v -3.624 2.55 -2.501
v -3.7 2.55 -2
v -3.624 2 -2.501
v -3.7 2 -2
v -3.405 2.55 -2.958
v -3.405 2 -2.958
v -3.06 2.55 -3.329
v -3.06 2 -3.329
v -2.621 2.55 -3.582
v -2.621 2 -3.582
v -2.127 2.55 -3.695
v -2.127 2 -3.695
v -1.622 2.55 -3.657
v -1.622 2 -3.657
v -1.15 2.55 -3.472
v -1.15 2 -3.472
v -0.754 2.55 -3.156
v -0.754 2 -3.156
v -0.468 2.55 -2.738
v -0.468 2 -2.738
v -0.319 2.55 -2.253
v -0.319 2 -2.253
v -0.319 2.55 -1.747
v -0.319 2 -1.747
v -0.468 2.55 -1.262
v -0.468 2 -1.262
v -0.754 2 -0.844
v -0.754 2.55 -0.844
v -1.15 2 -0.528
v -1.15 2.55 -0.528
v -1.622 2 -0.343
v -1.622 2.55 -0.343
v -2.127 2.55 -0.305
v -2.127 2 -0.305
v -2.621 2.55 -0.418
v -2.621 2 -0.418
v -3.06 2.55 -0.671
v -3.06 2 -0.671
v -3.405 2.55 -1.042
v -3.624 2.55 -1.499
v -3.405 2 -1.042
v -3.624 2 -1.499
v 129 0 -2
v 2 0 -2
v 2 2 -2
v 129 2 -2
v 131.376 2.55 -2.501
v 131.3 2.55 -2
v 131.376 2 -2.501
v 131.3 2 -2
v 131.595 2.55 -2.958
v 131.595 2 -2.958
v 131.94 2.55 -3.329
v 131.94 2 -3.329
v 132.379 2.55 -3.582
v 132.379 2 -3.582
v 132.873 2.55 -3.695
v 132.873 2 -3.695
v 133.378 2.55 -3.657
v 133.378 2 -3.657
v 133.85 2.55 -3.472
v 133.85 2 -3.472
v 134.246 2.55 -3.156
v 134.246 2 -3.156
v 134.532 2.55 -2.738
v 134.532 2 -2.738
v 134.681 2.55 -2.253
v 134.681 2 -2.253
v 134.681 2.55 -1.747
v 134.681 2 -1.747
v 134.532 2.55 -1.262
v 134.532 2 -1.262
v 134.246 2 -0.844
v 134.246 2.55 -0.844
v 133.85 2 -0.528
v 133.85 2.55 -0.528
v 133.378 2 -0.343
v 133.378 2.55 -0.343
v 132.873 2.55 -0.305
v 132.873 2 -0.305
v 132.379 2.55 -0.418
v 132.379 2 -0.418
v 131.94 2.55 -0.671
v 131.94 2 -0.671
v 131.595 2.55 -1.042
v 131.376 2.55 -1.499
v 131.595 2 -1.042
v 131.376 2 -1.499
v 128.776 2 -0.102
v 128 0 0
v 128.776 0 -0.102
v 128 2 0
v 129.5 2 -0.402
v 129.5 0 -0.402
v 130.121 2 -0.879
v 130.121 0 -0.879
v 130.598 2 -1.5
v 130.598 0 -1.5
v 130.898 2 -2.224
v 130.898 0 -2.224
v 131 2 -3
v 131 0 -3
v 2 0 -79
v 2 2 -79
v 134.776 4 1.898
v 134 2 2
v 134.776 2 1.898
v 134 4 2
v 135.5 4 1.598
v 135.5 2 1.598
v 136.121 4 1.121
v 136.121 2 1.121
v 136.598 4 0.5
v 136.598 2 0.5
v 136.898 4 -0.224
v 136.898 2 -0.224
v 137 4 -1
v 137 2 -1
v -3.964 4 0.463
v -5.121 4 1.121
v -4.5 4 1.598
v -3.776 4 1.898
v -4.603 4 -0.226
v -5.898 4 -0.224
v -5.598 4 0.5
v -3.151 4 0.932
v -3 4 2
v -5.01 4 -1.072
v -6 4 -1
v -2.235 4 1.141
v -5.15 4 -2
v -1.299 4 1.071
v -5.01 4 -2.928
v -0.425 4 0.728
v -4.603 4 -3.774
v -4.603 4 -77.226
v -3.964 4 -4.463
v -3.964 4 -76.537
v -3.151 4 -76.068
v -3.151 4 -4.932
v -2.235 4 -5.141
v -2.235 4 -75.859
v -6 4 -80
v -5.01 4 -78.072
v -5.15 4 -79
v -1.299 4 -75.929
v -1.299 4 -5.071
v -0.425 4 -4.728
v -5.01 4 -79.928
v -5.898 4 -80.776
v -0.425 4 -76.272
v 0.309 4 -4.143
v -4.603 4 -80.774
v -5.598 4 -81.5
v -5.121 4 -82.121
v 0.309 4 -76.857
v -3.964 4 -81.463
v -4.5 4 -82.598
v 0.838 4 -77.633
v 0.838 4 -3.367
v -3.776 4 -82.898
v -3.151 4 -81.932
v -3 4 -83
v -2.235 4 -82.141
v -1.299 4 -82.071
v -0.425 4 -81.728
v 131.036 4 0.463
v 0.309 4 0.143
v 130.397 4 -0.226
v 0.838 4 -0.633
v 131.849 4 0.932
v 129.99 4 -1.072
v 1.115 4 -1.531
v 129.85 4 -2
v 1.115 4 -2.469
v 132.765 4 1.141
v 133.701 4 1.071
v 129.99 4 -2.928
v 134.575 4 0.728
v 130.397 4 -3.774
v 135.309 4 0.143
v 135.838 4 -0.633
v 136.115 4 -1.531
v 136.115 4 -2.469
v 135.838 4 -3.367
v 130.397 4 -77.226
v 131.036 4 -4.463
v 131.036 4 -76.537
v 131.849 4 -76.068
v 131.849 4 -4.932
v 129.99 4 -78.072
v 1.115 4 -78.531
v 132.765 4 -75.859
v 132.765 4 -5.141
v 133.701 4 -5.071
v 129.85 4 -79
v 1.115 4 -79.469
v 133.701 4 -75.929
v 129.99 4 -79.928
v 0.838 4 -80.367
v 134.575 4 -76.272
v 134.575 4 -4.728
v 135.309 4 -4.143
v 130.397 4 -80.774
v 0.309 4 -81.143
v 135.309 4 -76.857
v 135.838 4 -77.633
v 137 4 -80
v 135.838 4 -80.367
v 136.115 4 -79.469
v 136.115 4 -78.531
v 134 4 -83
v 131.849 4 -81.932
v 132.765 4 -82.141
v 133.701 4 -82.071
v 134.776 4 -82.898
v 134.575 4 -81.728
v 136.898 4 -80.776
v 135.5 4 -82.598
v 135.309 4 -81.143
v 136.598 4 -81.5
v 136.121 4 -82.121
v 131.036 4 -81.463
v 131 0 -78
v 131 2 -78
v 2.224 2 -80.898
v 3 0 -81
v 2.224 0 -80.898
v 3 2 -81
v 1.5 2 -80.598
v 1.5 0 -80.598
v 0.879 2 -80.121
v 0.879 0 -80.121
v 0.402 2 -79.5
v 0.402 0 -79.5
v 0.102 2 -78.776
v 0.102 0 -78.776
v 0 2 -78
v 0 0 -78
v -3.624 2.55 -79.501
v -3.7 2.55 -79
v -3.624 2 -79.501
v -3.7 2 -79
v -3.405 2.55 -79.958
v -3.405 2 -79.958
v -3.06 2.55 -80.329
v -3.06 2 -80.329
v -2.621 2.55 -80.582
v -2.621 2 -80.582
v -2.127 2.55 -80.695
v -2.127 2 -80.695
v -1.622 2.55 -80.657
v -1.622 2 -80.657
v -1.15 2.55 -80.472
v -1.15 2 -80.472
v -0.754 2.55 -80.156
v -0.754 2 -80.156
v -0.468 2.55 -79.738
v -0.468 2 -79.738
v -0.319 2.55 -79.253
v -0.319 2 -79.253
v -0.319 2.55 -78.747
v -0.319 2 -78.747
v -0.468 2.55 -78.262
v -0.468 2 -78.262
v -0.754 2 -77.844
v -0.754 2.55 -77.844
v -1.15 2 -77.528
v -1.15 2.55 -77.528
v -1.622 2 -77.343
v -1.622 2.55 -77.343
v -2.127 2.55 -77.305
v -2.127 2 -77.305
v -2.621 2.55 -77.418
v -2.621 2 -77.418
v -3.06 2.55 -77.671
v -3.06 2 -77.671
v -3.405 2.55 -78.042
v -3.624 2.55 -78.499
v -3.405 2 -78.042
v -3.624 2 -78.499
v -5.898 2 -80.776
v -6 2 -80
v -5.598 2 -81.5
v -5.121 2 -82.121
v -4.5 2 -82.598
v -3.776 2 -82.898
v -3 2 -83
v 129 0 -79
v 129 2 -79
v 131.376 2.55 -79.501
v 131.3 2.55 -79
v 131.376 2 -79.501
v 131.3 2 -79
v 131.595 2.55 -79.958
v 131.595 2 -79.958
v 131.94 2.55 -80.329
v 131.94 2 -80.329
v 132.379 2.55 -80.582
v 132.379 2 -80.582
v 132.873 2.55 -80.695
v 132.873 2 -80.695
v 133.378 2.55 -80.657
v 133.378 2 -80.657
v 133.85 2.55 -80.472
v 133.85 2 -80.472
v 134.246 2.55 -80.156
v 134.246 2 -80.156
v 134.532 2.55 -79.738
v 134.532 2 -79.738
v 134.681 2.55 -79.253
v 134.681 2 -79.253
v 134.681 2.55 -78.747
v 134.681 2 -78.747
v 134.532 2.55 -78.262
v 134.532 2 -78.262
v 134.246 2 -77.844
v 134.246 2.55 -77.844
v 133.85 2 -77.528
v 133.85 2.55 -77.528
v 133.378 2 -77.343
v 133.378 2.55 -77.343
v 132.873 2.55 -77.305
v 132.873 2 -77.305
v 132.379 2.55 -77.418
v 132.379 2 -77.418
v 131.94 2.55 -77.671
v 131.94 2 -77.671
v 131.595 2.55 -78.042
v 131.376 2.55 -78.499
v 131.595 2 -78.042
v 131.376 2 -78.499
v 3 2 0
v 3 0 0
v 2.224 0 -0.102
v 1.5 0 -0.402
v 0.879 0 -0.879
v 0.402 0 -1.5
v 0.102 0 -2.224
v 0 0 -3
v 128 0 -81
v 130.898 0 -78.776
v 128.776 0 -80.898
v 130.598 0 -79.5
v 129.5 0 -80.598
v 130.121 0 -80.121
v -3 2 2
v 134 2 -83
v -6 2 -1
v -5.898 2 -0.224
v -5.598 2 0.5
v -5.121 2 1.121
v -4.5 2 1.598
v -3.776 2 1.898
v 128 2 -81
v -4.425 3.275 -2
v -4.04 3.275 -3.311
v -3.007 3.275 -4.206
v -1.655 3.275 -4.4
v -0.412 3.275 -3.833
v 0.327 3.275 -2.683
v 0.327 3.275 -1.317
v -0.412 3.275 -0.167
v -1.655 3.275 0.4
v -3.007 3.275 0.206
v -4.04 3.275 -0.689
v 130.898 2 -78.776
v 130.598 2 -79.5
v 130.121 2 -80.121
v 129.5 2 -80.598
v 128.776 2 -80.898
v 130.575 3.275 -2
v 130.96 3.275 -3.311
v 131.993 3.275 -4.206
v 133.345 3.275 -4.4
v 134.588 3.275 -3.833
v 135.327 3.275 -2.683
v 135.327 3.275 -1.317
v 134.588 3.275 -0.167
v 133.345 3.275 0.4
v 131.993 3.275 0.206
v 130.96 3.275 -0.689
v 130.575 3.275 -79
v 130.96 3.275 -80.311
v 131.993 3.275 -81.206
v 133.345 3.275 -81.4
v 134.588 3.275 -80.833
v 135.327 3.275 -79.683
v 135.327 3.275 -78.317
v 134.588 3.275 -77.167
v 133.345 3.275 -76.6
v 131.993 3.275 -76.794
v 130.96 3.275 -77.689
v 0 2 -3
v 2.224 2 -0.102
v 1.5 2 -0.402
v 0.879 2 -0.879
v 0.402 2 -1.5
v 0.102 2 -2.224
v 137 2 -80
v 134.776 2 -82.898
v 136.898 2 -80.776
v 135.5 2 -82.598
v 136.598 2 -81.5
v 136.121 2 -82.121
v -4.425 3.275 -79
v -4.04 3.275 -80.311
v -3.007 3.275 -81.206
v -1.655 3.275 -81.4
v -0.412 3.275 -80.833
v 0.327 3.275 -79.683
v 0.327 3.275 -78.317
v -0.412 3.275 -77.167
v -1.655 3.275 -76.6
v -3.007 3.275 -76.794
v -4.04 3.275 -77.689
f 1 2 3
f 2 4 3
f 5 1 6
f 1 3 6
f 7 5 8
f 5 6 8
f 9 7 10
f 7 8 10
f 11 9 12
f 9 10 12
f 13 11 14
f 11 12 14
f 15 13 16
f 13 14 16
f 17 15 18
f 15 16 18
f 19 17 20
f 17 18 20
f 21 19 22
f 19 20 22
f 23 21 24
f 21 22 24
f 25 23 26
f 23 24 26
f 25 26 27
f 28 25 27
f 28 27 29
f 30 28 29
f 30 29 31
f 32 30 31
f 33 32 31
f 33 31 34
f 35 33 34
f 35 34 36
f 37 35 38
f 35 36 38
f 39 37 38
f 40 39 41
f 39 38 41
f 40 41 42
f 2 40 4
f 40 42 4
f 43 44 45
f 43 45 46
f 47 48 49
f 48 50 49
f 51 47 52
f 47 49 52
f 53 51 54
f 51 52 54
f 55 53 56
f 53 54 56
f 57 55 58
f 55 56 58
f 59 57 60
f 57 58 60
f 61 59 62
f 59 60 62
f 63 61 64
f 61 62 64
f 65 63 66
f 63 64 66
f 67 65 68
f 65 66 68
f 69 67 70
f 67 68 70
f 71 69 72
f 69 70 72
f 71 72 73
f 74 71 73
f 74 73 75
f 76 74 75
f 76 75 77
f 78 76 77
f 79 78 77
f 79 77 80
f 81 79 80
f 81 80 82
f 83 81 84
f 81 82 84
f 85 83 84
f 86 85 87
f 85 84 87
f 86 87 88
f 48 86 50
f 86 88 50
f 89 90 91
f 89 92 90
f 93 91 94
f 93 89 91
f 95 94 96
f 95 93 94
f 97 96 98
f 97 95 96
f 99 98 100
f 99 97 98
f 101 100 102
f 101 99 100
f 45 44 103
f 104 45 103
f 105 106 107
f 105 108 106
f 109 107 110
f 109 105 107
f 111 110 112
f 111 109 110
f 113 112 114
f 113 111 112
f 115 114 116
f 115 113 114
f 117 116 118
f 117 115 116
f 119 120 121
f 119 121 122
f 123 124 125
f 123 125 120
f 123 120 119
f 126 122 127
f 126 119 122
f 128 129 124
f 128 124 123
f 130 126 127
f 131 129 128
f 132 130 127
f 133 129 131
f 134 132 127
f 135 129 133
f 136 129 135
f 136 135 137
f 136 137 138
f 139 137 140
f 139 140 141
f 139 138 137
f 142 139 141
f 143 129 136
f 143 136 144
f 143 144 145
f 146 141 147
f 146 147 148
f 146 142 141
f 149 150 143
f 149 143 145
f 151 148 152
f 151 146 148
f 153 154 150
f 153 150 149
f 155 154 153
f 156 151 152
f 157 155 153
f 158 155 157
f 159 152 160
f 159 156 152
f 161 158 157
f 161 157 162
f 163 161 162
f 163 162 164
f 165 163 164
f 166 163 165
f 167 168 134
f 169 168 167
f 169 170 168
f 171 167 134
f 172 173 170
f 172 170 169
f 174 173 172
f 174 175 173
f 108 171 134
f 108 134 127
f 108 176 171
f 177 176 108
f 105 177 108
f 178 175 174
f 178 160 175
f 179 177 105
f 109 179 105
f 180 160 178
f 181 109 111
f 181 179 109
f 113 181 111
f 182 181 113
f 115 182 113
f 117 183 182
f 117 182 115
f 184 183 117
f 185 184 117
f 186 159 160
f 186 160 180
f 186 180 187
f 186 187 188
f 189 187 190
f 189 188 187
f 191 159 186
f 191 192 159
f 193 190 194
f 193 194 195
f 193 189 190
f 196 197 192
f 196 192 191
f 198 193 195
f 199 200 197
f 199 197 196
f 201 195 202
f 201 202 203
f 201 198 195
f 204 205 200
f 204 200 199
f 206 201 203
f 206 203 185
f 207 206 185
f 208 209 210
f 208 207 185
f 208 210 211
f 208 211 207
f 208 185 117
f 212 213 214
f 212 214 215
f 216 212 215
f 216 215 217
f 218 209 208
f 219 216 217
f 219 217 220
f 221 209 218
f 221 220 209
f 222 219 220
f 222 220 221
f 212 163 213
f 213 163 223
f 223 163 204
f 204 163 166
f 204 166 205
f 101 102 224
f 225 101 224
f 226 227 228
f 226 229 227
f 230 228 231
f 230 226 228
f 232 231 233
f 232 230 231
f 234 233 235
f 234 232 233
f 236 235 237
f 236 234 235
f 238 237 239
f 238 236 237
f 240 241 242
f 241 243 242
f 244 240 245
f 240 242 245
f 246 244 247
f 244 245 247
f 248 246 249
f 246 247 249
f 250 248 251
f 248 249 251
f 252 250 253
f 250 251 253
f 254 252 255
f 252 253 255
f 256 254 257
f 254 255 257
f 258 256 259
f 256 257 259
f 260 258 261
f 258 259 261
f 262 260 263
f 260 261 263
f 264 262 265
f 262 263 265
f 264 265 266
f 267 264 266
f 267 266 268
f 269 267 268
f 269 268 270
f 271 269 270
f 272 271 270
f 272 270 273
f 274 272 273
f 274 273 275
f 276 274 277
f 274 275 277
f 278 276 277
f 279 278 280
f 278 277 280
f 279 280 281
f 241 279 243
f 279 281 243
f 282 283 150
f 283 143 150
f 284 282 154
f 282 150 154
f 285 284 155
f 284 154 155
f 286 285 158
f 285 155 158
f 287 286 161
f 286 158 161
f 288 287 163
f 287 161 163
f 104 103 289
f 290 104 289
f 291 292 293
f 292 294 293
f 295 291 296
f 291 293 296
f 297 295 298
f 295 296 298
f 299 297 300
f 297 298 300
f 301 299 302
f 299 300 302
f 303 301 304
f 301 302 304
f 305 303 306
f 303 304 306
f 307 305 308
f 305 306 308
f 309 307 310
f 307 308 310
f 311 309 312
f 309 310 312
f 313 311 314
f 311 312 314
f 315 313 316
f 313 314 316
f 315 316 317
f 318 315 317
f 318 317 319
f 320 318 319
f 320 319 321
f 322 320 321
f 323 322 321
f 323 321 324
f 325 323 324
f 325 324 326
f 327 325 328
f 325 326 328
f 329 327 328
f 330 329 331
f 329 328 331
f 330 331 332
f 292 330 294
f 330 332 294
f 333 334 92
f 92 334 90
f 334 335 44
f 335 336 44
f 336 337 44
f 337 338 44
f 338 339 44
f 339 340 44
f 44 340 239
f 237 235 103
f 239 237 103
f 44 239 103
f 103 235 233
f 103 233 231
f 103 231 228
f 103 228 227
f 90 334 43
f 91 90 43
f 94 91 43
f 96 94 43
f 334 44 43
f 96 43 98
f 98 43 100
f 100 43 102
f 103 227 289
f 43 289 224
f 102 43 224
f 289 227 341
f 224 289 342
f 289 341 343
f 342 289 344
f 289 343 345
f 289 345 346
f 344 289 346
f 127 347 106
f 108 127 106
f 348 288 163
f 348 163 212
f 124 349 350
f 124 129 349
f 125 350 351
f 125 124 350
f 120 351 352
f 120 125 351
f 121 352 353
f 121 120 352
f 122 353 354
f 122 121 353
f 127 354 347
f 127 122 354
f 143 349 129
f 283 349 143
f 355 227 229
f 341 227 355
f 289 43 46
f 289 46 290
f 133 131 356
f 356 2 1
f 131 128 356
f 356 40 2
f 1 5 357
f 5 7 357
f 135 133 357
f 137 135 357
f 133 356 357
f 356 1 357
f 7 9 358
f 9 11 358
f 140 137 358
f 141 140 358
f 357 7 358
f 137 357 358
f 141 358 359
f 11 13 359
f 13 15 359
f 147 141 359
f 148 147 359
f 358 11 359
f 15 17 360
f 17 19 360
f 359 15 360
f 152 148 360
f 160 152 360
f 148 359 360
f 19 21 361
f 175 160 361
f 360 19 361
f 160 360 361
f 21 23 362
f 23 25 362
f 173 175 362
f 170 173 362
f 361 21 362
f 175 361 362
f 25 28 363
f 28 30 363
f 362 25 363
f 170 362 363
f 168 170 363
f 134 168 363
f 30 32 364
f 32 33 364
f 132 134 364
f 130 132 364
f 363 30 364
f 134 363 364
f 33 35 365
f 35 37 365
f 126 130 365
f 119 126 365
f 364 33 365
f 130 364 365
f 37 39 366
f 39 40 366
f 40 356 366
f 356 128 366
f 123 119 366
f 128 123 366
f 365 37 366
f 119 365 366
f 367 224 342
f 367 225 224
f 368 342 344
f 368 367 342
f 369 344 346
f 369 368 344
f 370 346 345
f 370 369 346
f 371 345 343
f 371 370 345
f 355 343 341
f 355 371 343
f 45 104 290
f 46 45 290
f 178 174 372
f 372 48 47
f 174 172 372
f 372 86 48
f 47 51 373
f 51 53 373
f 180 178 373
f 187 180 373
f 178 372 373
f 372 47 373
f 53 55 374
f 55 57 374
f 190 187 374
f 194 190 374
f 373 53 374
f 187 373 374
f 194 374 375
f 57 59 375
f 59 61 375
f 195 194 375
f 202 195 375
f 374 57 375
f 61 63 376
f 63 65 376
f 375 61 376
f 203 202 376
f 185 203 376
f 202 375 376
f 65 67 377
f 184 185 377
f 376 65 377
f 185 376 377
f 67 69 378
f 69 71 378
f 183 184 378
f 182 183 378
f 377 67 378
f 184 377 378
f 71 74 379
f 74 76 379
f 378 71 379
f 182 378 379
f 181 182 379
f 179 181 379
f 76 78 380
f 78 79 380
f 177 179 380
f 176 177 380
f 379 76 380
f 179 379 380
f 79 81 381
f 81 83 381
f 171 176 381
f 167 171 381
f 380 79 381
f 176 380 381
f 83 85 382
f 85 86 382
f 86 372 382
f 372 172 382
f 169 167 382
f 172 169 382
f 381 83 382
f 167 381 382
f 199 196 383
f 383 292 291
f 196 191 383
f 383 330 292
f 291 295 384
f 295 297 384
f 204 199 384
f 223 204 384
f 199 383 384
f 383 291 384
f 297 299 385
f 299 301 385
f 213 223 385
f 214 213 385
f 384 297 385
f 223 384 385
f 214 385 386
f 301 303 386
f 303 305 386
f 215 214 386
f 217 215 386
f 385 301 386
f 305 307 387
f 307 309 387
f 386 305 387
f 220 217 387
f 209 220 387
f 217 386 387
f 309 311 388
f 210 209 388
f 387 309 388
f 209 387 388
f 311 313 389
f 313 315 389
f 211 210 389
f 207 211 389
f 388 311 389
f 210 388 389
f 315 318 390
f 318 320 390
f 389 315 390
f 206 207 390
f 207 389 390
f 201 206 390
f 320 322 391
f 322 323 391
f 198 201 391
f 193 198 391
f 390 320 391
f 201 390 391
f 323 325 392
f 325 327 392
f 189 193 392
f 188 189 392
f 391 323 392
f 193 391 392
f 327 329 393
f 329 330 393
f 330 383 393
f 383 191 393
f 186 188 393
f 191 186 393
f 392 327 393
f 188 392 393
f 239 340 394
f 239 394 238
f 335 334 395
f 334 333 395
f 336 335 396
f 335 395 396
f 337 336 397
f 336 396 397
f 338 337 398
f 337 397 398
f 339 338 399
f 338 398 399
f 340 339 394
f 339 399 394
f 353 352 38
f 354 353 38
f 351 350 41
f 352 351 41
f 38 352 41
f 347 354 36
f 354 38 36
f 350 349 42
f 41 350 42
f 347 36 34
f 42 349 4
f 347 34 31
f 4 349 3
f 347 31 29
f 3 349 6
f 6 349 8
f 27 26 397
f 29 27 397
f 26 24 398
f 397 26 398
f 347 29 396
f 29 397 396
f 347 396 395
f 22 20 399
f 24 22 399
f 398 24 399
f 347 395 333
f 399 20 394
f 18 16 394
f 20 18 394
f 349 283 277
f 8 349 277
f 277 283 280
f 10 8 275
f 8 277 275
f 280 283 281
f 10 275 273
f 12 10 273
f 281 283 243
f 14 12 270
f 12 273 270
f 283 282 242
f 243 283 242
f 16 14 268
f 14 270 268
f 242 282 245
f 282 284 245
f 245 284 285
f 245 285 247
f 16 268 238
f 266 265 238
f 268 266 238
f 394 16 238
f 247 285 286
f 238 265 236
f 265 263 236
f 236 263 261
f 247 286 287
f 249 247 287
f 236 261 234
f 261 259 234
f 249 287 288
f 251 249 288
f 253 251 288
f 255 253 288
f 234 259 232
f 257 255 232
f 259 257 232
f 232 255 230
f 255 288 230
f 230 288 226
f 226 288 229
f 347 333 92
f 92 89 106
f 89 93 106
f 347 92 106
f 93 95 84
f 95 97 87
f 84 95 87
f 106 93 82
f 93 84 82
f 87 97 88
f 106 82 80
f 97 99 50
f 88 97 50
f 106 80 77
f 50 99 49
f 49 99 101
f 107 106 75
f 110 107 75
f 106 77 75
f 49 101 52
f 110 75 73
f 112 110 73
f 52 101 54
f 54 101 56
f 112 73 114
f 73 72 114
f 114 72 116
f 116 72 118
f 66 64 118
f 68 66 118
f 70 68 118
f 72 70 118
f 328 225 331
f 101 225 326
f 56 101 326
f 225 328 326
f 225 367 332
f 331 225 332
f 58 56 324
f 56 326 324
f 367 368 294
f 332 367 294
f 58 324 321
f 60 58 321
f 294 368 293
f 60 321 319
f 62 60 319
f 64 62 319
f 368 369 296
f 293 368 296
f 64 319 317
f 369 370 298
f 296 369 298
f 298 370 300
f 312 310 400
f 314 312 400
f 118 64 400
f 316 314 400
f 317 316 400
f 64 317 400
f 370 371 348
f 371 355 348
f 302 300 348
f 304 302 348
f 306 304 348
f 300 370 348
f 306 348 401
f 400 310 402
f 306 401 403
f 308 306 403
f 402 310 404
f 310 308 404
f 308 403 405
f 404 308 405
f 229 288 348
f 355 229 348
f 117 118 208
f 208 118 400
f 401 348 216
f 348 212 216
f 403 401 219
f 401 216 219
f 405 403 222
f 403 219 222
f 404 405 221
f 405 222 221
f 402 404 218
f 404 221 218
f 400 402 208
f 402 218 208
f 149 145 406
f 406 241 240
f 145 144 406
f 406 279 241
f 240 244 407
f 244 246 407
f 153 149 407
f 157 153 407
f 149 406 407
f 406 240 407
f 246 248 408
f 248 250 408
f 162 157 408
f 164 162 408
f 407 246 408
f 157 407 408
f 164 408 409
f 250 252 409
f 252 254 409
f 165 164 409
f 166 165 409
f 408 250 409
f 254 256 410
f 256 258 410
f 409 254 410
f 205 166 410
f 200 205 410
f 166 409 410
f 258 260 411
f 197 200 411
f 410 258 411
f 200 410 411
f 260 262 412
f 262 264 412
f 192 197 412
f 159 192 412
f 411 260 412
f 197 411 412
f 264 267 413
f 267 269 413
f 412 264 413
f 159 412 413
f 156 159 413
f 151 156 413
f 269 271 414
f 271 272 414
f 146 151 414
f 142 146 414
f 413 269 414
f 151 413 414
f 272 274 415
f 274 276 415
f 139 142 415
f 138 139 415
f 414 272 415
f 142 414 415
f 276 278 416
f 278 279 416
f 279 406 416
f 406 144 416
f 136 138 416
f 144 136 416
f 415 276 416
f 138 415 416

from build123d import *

# Parameters (mm, degrees)
SKIZZE1_W                                            = 131
SKIZZE1_H                                            = 81
SKIZZE1_W_2                                          = 127
SKIZZE1_H_2                                          = 77
AUFSATZ_LINEAR_AUSTRAGEN1_DEPTH                      = 2
SKIZZE2_W                                            = 143
SKIZZE2_H                                            = 85
AUFSATZ_LINEAR_AUSTRAGEN2_DEPTH                      = 2
VERRUNDUNG1_R                                        = 3
FORMSENKUNG_F_R_M3_LINSENSENKSCHRAUBE_MI_D           = 3.4
FORMSENKUNG_F_R_M3_LINSENSENKSCHRAUBE_MI_DEPTH       = 7.25
FORMSENKUNG_F_R_M3_LINSENSENKSCHRAUBE_MI_CSINK_D     = 6.3
FORMSENKUNG_F_R_M3_LINSENSENKSCHRAUBE_MI_CSINK_ANGLE = 90
FORMSENKUNG_F_R_M3_LINSENSENKSCHRAUBE_MI_TIP         = 1.021463052


with BuildPart() as part:
    # Skizze1 → Aufsatz-Linear austragen1 (new body)
    with BuildSketch(Plane(origin=(0, 0, 0), x_dir=(1, 0, 0), z_dir=(0, 1, 0))):
        with Locations((65.5, 40.5)):
            Rectangle(SKIZZE1_W, SKIZZE1_H)
        with Locations((65.5, 40.5)):
            Rectangle(SKIZZE1_W_2, SKIZZE1_H_2, mode=Mode.SUBTRACT)
    extrude(amount=AUFSATZ_LINEAR_AUSTRAGEN1_DEPTH)

    # Skizze2 → Aufsatz-Linear austragen2 (add)
    with BuildSketch(Plane(origin=(0, 2, 0), x_dir=(1, 0, 0), z_dir=(0, 1, 0))):
        with Locations((65.5, 40.5)):
            Rectangle(SKIZZE2_W, SKIZZE2_H)
    extrude(amount=AUFSATZ_LINEAR_AUSTRAGEN2_DEPTH)

    # Verrundung1
    verrundung1_edges = [part.edges().sort_by_distance(p)[0] for p in [
        (-6, 3, -83),
        (-6, 3, 2),
        (137, 3, 2),
        (137, 3, -83),
        (0, 1, -81),
        (131, 1, -81),
        (131, 1, 0),
        (0, 1, 0),
    ]]
    fillet(verrundung1_edges, radius=VERRUNDUNG1_R)

    # Formsenkung für M3 Linsensenkschraube mit Schlitz1
    with Locations(Plane(origin=(0, 4, 0), x_dir=(1, 0, 0), z_dir=(0, 1, 0))):
        with Locations((-2, 2), (133, 79), (-2, 79), (133, 2)):
            CounterSinkHole(FORMSENKUNG_F_R_M3_LINSENSENKSCHRAUBE_MI_D / 2, FORMSENKUNG_F_R_M3_LINSENSENKSCHRAUBE_MI_CSINK_D / 2, depth=FORMSENKUNG_F_R_M3_LINSENSENKSCHRAUBE_MI_DEPTH, counter_sink_angle=FORMSENKUNG_F_R_M3_LINSENSENKSCHRAUBE_MI_CSINK_ANGLE)
            with Locations((0, 0, -(FORMSENKUNG_F_R_M3_LINSENSENKSCHRAUBE_MI_DEPTH + FORMSENKUNG_F_R_M3_LINSENSENKSCHRAUBE_MI_TIP / 2))):  # 118° drill point
                Cone(0, FORMSENKUNG_F_R_M3_LINSENSENKSCHRAUBE_MI_D / 2, FORMSENKUNG_F_R_M3_LINSENSENKSCHRAUBE_MI_TIP, mode=Mode.SUBTRACT)


solid = part.part
